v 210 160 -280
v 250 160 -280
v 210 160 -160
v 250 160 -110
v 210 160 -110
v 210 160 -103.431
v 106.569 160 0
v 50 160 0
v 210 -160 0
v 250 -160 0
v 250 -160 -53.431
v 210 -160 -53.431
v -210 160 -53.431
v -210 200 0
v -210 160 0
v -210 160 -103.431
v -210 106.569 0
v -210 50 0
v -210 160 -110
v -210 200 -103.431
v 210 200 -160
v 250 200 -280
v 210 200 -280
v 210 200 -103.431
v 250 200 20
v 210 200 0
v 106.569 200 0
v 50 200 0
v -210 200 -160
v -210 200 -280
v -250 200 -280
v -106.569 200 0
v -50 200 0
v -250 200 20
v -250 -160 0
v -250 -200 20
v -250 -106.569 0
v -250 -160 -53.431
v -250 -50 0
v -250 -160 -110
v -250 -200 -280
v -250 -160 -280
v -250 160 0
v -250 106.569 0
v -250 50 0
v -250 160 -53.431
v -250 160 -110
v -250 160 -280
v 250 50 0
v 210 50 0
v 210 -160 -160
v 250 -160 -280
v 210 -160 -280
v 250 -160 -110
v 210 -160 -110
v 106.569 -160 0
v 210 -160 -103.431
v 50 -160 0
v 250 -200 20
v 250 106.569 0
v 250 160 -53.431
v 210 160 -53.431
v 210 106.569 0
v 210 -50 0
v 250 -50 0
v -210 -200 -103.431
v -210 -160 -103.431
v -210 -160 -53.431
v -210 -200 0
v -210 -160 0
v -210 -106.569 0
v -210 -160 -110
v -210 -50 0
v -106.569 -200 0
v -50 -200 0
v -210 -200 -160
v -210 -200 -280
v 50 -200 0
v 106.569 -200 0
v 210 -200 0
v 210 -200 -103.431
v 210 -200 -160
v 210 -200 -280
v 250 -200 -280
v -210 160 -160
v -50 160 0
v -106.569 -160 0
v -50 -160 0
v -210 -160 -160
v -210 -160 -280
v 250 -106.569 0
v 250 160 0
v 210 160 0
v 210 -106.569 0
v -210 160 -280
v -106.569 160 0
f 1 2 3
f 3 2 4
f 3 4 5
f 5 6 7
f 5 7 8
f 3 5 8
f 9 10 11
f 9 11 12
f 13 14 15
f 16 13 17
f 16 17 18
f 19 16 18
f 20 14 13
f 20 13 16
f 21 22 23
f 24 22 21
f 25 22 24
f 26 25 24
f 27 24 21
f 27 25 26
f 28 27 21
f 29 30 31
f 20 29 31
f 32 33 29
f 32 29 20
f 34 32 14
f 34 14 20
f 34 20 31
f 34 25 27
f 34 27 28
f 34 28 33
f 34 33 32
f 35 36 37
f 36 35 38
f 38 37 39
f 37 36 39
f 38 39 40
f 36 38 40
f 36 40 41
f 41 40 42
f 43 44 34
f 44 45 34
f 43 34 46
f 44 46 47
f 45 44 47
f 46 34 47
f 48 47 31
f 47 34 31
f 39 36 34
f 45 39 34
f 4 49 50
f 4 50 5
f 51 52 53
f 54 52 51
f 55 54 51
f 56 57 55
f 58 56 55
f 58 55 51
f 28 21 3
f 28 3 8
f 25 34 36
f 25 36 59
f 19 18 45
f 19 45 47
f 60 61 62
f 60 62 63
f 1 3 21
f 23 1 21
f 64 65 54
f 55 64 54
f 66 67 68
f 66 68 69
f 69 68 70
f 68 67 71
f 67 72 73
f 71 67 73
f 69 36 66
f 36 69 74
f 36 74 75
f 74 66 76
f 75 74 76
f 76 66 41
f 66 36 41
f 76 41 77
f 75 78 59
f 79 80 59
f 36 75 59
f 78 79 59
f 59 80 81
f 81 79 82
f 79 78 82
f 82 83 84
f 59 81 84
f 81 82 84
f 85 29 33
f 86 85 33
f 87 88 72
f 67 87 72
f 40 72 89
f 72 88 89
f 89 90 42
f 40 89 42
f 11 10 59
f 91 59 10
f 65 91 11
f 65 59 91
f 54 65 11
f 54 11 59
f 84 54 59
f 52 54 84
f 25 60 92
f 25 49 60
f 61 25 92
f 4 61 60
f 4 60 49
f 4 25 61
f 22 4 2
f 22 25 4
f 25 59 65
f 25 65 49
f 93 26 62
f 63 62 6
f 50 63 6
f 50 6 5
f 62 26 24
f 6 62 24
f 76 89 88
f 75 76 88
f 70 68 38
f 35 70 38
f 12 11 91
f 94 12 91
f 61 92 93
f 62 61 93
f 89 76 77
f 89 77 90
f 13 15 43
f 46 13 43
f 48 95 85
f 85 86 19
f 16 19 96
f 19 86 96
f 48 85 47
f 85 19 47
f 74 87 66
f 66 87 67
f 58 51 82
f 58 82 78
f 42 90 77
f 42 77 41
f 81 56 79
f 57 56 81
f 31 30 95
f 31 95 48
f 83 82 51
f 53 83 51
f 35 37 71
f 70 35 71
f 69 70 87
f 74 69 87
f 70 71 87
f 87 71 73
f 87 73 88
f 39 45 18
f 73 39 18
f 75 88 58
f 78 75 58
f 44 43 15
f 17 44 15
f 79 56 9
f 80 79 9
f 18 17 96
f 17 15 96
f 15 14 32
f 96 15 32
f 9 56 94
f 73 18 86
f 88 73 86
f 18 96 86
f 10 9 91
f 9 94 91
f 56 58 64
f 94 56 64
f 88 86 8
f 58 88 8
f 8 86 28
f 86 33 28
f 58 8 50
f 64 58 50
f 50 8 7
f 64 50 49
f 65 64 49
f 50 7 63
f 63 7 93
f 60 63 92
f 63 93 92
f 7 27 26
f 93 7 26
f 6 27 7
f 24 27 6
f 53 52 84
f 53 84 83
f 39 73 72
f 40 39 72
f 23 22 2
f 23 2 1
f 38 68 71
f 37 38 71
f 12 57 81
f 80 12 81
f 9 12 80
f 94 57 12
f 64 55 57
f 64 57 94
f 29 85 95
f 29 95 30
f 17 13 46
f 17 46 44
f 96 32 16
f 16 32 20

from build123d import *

# Parameters (mm, degrees)
SKETCH_1_W      = 500
SKETCH_1_H      = 400
EXTRUDE_1_DEPTH = 20
SKETCH_2_W      = 40
SKETCH_2_H      = 40
EXTRUDE_2_DEPTH = 280
EXTRUDE_3_DEPTH = 40
EXTRUDE_START   = -360
EXTRUDE_4_DEPTH = 40
EXTRUDE_5_DEPTH = 40
EXTRUDE_START_2 = -460
EXTRUDE_6_DEPTH = 40


with BuildPart() as part:
    # 草图1 → 凸台-拉伸1 (new body)
    with BuildSketch(Plane.XY):
        Rectangle(SKETCH_1_W, SKETCH_1_H)
    extrude(amount=EXTRUDE_1_DEPTH)

    # 草图2 → 凸台-拉伸2 (add)
    with BuildSketch(Plane(origin=(0, 0, 0), x_dir=(-1, 0, 0), z_dir=(0, 0, -1))):
        with Locations((-230, 180)):
            Rectangle(SKETCH_2_W, SKETCH_2_H)
        with Locations((230, 180)):
            Rectangle(SKETCH_2_W, SKETCH_2_H)
        with Locations((230, -180)):
            Rectangle(SKETCH_2_W, SKETCH_2_H)
        with Locations((-230, -180)):
            Rectangle(SKETCH_2_W, SKETCH_2_H)
    extrude(amount=EXTRUDE_2_DEPTH)

    # 草图3 → 凸台-拉伸3 (add)
    with BuildSketch(Plane(origin=(0, 200, 0), x_dir=(1, 0, 0), z_dir=(0, 1, 0))):
        Polygon((-210, 160), (-50, 0), (-106.568542495, 0), (-210, 103.431457505), align=None)
        Polygon((106.568542495, 0), (210, 103.431457505), (210, 160), (50, 0), align=None)
    extrude(amount=-EXTRUDE_3_DEPTH)

    # 草图3<3> → 凸台-拉伸4 (add)
    with BuildSketch(Plane(origin=(0, 200, 0), x_dir=(1, 0, 0), z_dir=(0, 1, 0)).offset(EXTRUDE_START)):
        Polygon((-210, 160), (-50, 0), (-106.568542495, 0), (-210, 103.431457505), align=None)
        Polygon((106.568542495, 0), (210, 103.431457505), (210, 160), (50, 0), align=None)
    extrude(amount=-EXTRUDE_4_DEPTH)

    # 草图4 → 凸台-拉伸5 (add)
    with BuildSketch(Plane(origin=(250, 0, 0), x_dir=(0, 0, -1), z_dir=(1, 0, 0))):
        Polygon((0, 50), (110, 160), (53.431457505, 160), (0, 106.568542495), align=None)
        Polygon((53.431457505, -160), (0, -106.568542495), (0, -50), (110, -160), align=None)
    extrude(amount=-EXTRUDE_5_DEPTH)

    # 草图4<2> → 凸台-拉伸6 (add)
    with BuildSketch(Plane(origin=(250, 0, 0), x_dir=(0, 0, -1), z_dir=(1, 0, 0)).offset(EXTRUDE_START_2)):
        Polygon((0, 50), (110, 160), (53.431457505, 160), (0, 106.568542495), align=None)
        Polygon((53.431457505, -160), (0, -106.568542495), (0, -50), (110, -160), align=None)
    extrude(amount=-EXTRUDE_6_DEPTH)


solid = part.part
